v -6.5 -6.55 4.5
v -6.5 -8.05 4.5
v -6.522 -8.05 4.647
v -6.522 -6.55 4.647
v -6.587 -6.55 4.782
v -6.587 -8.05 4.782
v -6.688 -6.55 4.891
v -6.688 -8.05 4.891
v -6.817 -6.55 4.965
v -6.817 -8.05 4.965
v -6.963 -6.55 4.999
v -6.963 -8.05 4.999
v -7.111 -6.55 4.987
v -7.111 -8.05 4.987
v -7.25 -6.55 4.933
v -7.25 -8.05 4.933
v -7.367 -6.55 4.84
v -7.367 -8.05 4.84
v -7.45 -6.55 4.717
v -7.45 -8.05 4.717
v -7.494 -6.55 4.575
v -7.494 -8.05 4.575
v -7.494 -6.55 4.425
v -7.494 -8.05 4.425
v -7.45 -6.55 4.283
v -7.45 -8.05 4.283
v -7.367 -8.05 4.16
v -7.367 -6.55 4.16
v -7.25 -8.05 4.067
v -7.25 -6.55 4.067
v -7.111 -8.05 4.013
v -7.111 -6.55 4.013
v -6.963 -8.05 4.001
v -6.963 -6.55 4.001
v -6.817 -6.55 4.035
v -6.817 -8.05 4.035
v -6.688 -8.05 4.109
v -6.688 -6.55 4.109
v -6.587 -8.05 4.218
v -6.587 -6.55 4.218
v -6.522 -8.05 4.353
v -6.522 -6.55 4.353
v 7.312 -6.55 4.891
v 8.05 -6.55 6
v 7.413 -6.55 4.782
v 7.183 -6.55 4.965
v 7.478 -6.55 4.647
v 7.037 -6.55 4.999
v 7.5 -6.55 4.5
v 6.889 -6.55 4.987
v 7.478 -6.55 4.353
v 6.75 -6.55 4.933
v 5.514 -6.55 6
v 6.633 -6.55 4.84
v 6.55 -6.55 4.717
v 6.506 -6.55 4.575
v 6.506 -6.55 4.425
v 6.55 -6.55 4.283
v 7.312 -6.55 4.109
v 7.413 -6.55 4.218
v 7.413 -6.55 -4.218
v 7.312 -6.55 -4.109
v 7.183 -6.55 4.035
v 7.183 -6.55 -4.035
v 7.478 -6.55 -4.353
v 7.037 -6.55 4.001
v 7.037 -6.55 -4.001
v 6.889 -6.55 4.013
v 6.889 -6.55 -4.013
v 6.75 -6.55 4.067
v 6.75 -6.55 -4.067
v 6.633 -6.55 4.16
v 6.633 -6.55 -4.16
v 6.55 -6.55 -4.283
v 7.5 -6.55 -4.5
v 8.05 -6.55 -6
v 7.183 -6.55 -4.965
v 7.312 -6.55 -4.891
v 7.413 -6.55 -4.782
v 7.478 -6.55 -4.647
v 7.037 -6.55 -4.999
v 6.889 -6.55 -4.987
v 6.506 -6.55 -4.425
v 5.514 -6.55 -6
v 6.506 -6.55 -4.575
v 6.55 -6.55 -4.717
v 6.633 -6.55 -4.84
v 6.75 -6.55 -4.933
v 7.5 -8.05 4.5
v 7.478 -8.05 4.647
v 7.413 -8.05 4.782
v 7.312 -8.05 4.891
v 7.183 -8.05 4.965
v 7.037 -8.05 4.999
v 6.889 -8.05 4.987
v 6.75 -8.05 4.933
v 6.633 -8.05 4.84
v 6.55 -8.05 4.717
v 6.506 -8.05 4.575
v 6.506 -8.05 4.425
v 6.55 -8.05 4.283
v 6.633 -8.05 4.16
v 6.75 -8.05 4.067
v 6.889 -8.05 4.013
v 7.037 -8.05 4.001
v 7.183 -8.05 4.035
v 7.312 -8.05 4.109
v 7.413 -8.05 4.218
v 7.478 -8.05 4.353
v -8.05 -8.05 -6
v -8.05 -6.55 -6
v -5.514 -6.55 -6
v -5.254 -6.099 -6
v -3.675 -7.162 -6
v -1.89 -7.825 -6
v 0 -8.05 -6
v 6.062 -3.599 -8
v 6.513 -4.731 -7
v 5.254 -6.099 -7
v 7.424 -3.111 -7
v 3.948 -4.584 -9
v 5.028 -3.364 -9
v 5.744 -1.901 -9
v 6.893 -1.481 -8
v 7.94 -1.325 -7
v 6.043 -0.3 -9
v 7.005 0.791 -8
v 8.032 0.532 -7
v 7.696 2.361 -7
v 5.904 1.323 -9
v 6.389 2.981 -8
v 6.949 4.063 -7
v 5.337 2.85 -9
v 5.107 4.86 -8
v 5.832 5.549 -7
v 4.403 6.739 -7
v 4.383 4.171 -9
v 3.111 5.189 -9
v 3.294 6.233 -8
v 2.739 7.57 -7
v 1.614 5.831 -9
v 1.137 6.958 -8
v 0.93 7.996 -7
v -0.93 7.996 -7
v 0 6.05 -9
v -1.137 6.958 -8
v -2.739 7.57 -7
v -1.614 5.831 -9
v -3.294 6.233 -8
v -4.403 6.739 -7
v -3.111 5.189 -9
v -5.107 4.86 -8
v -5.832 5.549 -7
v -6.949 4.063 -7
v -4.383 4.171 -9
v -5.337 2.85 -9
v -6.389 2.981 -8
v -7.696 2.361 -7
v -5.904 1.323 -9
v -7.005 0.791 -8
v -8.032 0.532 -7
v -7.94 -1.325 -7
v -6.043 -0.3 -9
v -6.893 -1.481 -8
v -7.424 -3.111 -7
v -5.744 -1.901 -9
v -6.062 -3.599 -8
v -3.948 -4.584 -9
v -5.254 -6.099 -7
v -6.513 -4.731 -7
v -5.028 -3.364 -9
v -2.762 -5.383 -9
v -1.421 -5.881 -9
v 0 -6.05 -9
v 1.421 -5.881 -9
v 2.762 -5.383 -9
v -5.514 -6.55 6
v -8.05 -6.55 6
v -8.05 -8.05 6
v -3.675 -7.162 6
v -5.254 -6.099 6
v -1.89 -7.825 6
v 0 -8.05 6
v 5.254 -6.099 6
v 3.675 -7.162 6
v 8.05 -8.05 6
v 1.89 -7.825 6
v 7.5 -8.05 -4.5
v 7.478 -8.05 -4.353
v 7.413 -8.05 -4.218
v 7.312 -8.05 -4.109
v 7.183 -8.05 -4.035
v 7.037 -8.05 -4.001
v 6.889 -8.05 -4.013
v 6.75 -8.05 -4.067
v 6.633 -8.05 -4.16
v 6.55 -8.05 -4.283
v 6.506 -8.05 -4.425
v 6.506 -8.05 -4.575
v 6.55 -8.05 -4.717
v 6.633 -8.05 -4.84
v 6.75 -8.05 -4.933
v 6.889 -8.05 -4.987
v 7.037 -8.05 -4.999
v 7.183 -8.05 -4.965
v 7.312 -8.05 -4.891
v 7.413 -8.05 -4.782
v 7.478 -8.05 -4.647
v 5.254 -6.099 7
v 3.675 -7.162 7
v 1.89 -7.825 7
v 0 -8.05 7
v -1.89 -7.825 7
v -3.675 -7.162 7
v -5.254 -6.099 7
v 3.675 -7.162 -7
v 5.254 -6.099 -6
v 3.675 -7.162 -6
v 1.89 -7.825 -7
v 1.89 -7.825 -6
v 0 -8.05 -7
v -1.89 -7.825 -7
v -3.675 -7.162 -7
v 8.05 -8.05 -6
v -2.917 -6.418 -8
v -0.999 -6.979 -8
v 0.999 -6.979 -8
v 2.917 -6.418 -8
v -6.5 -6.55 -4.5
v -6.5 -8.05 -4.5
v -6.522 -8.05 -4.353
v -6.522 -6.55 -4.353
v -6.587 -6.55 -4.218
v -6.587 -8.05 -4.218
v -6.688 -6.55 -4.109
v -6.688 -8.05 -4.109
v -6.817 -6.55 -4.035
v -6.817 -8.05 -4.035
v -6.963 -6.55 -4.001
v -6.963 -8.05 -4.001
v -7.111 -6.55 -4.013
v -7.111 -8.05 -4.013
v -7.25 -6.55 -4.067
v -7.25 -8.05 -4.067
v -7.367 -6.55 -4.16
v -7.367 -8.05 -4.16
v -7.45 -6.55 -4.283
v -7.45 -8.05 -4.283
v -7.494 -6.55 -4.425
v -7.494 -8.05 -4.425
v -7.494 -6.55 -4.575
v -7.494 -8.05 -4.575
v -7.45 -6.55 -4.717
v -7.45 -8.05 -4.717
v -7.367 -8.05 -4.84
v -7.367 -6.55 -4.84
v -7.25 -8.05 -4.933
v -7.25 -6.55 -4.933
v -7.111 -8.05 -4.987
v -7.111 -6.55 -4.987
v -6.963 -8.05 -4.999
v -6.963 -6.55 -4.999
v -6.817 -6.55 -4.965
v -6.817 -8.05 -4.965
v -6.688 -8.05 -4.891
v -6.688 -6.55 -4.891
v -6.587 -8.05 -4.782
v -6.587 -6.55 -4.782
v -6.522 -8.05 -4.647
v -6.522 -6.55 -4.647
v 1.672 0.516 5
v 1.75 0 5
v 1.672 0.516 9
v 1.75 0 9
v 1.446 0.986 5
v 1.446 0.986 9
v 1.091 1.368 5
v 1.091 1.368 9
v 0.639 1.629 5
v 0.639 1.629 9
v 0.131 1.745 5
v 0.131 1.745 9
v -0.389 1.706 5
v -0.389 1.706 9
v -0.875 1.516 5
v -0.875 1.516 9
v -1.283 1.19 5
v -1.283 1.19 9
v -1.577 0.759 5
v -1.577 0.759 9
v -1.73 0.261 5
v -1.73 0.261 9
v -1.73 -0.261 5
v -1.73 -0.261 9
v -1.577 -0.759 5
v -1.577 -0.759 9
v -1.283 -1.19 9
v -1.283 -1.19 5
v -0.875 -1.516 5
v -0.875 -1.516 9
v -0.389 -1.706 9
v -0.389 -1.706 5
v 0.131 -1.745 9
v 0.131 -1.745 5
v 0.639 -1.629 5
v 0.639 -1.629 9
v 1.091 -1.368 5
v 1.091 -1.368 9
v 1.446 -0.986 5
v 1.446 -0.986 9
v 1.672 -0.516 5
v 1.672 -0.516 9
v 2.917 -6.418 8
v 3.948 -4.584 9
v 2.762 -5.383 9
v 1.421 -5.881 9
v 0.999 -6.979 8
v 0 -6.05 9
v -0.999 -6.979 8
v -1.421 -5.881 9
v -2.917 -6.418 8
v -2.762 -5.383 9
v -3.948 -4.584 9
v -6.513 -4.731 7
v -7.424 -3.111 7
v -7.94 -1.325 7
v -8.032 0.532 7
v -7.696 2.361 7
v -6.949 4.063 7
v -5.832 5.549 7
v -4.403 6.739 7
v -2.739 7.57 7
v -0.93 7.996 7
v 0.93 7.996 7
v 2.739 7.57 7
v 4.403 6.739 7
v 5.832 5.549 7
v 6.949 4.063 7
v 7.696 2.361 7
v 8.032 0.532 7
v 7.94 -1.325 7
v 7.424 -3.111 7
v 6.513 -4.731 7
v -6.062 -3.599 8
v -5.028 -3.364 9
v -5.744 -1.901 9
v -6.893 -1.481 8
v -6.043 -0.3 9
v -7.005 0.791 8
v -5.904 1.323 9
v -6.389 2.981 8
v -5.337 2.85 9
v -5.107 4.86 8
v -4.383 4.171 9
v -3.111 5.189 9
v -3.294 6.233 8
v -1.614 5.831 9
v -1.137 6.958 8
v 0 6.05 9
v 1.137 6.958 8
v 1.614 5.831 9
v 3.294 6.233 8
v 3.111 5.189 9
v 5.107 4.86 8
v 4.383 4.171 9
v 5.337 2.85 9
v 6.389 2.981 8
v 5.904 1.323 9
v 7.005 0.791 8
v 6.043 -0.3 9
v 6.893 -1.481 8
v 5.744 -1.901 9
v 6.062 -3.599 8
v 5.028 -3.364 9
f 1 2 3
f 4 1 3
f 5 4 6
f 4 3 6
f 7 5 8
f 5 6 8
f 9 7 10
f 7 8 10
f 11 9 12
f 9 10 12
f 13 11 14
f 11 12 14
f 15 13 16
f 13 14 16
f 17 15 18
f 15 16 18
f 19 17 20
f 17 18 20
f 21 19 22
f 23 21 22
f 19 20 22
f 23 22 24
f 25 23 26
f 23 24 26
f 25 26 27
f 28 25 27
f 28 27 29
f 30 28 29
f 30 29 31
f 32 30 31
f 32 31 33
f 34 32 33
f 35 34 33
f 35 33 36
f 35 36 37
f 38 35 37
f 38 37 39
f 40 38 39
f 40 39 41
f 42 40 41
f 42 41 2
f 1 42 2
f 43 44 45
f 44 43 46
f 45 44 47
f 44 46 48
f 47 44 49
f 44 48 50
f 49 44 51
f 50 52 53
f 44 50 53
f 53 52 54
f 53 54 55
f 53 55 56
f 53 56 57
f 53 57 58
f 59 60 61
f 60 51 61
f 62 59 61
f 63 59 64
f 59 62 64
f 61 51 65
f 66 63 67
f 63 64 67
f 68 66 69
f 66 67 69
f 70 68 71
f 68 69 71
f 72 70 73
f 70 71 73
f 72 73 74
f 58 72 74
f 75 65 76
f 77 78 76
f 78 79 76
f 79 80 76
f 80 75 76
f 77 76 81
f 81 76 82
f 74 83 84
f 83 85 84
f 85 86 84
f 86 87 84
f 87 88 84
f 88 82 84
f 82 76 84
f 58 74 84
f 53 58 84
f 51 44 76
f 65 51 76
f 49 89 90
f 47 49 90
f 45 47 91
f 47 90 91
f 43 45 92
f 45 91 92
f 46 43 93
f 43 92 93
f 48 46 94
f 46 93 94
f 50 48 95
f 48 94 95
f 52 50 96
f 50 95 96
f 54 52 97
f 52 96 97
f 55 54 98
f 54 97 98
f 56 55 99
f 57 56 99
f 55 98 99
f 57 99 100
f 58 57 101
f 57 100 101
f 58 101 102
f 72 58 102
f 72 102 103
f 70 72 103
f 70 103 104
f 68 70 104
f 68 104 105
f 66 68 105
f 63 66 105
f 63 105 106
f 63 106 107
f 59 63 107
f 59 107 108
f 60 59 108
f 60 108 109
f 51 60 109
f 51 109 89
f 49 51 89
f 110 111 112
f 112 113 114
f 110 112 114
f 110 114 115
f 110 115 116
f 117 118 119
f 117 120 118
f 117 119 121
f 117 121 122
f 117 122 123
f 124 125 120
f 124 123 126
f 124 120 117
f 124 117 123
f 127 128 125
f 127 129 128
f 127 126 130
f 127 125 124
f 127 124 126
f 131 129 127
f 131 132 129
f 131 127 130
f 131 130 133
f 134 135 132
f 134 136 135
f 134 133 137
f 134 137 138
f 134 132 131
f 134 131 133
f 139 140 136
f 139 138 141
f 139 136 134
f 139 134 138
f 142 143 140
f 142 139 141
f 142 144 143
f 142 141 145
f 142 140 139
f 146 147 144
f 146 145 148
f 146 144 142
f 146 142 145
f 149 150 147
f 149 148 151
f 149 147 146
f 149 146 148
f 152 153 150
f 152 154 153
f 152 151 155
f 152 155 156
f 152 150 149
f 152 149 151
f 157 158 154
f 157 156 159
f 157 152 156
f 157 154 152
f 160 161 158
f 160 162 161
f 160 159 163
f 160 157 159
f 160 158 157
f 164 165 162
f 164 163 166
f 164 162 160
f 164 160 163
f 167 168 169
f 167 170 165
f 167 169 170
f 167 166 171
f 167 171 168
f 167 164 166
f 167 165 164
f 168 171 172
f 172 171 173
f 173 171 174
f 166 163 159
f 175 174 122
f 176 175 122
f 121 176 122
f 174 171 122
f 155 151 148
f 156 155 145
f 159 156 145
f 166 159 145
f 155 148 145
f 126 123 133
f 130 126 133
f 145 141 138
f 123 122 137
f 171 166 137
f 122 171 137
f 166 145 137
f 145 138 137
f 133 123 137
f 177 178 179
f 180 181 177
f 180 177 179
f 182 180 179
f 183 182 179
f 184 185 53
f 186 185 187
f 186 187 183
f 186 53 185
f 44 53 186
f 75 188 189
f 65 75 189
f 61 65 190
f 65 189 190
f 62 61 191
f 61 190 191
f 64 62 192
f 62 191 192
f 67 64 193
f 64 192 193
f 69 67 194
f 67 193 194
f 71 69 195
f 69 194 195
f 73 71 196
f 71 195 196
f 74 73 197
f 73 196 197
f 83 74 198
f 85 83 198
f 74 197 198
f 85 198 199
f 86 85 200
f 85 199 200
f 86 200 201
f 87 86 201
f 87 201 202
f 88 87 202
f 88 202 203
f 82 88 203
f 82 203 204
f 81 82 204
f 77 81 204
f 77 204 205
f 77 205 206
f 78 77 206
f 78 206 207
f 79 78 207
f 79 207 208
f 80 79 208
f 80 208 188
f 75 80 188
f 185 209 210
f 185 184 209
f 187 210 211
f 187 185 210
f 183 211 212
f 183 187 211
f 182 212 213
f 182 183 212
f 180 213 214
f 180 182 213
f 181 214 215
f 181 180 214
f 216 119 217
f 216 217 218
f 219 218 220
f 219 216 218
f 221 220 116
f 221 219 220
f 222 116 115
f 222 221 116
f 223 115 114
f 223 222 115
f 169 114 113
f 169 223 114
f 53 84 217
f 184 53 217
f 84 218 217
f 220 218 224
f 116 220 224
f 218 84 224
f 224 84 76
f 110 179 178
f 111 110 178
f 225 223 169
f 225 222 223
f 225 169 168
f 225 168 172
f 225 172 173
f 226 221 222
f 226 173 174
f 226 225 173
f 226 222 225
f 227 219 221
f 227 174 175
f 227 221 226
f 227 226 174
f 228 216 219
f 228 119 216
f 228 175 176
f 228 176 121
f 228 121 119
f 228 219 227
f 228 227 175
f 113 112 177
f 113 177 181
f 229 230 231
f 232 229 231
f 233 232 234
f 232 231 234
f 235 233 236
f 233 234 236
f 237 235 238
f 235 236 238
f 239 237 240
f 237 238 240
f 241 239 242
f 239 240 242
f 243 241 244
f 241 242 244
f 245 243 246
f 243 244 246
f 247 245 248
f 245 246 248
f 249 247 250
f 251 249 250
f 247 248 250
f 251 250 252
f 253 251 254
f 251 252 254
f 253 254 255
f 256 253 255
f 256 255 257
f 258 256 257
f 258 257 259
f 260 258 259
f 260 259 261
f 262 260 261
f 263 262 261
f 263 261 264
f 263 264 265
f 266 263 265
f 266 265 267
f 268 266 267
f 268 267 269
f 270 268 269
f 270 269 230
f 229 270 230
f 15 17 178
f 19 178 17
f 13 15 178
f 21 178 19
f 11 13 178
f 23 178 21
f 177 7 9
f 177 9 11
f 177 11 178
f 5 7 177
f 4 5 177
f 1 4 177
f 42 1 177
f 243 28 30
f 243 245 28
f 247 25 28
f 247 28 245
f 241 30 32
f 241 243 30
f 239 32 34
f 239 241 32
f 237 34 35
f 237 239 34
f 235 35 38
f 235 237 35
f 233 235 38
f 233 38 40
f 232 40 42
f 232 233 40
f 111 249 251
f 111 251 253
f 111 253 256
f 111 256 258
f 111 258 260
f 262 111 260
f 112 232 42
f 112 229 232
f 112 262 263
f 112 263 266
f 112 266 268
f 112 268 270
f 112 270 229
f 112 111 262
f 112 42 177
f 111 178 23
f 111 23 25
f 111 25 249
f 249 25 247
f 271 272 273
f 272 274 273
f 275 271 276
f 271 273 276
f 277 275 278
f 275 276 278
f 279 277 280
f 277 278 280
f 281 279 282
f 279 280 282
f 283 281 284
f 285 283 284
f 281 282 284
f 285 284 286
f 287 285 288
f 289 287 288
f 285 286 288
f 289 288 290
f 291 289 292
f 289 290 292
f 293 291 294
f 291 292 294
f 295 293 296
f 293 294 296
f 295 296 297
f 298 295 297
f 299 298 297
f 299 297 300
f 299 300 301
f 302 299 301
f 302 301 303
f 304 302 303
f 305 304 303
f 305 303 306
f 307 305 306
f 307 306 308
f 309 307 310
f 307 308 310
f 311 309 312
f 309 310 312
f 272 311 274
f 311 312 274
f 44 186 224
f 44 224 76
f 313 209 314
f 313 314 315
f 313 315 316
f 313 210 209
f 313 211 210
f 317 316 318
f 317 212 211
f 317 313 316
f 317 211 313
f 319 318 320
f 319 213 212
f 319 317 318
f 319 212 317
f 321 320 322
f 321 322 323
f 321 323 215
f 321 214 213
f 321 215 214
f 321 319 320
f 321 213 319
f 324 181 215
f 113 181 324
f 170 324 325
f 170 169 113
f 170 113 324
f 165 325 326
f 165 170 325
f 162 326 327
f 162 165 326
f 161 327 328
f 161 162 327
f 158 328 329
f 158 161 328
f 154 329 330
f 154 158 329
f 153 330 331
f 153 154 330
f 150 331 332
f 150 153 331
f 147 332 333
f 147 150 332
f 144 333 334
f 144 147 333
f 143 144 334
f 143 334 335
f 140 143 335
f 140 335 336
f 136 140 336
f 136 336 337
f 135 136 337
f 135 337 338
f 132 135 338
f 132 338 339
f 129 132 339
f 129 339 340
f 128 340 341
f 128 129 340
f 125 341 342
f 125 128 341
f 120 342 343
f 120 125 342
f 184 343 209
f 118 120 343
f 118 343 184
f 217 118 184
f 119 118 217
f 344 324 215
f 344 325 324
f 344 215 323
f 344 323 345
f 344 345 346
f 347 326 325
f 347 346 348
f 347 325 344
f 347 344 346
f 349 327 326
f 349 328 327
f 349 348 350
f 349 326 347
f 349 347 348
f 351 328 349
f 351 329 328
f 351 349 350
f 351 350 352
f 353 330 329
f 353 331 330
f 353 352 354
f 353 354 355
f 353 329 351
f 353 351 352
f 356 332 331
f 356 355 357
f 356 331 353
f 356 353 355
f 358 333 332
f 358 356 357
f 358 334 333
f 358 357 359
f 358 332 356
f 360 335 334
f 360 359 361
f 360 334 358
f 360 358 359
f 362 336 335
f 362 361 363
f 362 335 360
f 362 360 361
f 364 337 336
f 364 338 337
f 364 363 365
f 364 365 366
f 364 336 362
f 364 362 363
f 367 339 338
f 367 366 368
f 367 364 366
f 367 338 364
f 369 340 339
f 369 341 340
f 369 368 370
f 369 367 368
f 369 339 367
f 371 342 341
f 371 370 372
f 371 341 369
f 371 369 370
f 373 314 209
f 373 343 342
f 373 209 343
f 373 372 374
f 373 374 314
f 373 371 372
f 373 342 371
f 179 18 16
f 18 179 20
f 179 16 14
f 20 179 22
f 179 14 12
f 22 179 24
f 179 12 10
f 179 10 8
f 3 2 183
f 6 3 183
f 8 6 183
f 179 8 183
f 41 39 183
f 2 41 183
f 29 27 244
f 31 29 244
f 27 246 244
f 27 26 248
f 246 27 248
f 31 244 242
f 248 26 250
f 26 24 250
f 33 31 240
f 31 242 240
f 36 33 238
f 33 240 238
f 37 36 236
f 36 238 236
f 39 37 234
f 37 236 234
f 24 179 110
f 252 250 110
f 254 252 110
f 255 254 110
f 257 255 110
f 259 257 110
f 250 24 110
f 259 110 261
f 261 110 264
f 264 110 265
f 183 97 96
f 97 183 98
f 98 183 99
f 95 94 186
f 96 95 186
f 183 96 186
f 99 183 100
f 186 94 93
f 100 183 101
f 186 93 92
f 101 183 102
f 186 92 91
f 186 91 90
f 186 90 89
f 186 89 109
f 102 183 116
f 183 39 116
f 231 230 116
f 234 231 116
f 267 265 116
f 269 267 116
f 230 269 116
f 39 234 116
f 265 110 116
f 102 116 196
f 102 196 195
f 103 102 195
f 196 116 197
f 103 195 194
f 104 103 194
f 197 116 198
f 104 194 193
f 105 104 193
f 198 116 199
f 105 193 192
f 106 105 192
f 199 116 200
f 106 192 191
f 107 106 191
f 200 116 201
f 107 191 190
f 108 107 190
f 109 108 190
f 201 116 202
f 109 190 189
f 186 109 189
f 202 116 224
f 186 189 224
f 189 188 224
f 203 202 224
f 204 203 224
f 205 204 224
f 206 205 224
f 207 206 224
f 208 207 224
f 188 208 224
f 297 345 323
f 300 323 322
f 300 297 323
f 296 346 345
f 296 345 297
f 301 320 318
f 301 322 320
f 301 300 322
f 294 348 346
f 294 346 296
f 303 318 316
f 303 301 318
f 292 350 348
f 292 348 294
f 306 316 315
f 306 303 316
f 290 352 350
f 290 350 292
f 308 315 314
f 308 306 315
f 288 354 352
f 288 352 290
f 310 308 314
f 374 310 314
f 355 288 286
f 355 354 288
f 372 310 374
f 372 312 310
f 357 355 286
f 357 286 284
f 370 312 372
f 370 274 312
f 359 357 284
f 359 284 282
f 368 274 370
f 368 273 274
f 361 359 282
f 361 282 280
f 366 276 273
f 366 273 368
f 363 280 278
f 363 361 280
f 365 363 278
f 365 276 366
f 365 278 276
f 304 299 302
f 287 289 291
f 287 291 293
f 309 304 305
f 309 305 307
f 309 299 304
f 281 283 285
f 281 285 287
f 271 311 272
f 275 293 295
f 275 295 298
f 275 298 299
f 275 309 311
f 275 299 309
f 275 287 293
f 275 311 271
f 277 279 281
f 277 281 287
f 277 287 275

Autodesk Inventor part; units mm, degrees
ref_plane "YZ Plane" through (0, 0, 0) normal (1, 0, 0) x (0, 1, 0)
ref_plane "XZ Plane" through (0, 0, 0) normal (0, 1, 0) x (-1, 0, 0)
ref_plane "XY Plane" through (0, 0, 0) normal (0, 0, 1) x (1, 0, 0)
sketch "Sketch1" plane through (0, 0, 0) normal (0, 0, 1) x (1, 0, 0)
  arc A0 (5.2535, -6.0994) -> (-5.2535, -6.0994) centre (0, 0) ccw
  line L0 (0, 0) -> (0, -8.05) construction
  line L1 (0, -8.05) -> (8.05, -8.05)
  line L2 (8.05, -8.05) -> (8.05, -6.55)
  line L3 (8.05, -6.55) -> (5.5137, -6.55)
  line L4 (0, 0) -> (4.025, -6.9715) construction
  line L5 (5.5137, -6.55) -> (5.2535, -6.0994)
  line L6 (0, 0) -> (8.05, 0) construction
  line L7 (0, -8.05) -> (-8.05, -8.05)
  line L8 (-8.05, -8.05) -> (-8.05, -6.55)
  line L9 (-8.05, -6.55) -> (-5.5137, -6.55)
  line L10 (-5.5137, -6.55) -> (-5.2535, -6.0994)
  dimension "d0" = 16.1
  dimension "d1" = 30
  dimension "d2" = 1.5
  dimension "d3" = 1.5
extrude "Extrusion1" add sketch "Sketch1" along normal mid plane 12
sketch "Sketch2" plane through (0, 0, 0) normal (0, 0, 1) x (1, 0, 0)
  arc A0 (5.2535, -6.0994) -> (-5.2535, -6.0994) centre (0, 0) ccw projected
  circle A1 centre (0, 0) radius 8.05
  point P0 (4.8598, -6.4175)
extrude "Extrusion2" add sketch "Sketch2" along normal mid plane 18
chamfer "Chamfer1" distance 2 angle 45 2 edges at (-8.05, 0, 9) (-8.05, 0, -9)
sketch "Sketch3" plane through (0, 0, 9) normal (0, 0, 1) x (1, 0, 0)
  circle A0 centre (0, 0) radius 6.05 projected
  circle A1 centre (0, 0) radius 1.75
  dimension "d11" = 3.5
extrude "Extrusion3" cut sketch "Sketch3" against normal blind 4 contours A1
sketch "Sketch4" plane through (-8.05, -8.05, 6) normal (0, -1, 0) x (1, 0, 0)
  line L0 (0, -12) -> (0, 0) projected
  line L1 (16.1, -12) -> (16.1, 0) projected
  line L2 (16.1, 0) -> (8.05, 0) projected
  line L3 (8.05, 0) -> (8.05, -12) construction
  line L4 (0, -6) -> (16.1, -6) construction
  line L5 (1.05, -1.5) -> (15.05, -1.5) construction
  line L6 (15.05, -1.5) -> (15.05, -10.5) construction
  line L7 (15.05, -10.5) -> (1.05, -10.5) construction
  line L8 (1.05, -10.5) -> (1.05, -1.5) construction
  circle A0 centre (1.05, -1.5) radius 0.5
  circle A1 centre (15.05, -1.5) radius 0.5
  circle A2 centre (1.05, -10.5) radius 0.5
  circle A3 centre (15.05, -10.5) radius 0.5
  dimension "d14" = 9
  dimension "d15" = 4.5
  dimension "d16" = 14
  dimension "d17" = 7
  dimension "d18" = 1
extrude "Extrusion4" cut sketch "Sketch4" against normal up to surface (1.5 mm away)
properties part number "Motor"
